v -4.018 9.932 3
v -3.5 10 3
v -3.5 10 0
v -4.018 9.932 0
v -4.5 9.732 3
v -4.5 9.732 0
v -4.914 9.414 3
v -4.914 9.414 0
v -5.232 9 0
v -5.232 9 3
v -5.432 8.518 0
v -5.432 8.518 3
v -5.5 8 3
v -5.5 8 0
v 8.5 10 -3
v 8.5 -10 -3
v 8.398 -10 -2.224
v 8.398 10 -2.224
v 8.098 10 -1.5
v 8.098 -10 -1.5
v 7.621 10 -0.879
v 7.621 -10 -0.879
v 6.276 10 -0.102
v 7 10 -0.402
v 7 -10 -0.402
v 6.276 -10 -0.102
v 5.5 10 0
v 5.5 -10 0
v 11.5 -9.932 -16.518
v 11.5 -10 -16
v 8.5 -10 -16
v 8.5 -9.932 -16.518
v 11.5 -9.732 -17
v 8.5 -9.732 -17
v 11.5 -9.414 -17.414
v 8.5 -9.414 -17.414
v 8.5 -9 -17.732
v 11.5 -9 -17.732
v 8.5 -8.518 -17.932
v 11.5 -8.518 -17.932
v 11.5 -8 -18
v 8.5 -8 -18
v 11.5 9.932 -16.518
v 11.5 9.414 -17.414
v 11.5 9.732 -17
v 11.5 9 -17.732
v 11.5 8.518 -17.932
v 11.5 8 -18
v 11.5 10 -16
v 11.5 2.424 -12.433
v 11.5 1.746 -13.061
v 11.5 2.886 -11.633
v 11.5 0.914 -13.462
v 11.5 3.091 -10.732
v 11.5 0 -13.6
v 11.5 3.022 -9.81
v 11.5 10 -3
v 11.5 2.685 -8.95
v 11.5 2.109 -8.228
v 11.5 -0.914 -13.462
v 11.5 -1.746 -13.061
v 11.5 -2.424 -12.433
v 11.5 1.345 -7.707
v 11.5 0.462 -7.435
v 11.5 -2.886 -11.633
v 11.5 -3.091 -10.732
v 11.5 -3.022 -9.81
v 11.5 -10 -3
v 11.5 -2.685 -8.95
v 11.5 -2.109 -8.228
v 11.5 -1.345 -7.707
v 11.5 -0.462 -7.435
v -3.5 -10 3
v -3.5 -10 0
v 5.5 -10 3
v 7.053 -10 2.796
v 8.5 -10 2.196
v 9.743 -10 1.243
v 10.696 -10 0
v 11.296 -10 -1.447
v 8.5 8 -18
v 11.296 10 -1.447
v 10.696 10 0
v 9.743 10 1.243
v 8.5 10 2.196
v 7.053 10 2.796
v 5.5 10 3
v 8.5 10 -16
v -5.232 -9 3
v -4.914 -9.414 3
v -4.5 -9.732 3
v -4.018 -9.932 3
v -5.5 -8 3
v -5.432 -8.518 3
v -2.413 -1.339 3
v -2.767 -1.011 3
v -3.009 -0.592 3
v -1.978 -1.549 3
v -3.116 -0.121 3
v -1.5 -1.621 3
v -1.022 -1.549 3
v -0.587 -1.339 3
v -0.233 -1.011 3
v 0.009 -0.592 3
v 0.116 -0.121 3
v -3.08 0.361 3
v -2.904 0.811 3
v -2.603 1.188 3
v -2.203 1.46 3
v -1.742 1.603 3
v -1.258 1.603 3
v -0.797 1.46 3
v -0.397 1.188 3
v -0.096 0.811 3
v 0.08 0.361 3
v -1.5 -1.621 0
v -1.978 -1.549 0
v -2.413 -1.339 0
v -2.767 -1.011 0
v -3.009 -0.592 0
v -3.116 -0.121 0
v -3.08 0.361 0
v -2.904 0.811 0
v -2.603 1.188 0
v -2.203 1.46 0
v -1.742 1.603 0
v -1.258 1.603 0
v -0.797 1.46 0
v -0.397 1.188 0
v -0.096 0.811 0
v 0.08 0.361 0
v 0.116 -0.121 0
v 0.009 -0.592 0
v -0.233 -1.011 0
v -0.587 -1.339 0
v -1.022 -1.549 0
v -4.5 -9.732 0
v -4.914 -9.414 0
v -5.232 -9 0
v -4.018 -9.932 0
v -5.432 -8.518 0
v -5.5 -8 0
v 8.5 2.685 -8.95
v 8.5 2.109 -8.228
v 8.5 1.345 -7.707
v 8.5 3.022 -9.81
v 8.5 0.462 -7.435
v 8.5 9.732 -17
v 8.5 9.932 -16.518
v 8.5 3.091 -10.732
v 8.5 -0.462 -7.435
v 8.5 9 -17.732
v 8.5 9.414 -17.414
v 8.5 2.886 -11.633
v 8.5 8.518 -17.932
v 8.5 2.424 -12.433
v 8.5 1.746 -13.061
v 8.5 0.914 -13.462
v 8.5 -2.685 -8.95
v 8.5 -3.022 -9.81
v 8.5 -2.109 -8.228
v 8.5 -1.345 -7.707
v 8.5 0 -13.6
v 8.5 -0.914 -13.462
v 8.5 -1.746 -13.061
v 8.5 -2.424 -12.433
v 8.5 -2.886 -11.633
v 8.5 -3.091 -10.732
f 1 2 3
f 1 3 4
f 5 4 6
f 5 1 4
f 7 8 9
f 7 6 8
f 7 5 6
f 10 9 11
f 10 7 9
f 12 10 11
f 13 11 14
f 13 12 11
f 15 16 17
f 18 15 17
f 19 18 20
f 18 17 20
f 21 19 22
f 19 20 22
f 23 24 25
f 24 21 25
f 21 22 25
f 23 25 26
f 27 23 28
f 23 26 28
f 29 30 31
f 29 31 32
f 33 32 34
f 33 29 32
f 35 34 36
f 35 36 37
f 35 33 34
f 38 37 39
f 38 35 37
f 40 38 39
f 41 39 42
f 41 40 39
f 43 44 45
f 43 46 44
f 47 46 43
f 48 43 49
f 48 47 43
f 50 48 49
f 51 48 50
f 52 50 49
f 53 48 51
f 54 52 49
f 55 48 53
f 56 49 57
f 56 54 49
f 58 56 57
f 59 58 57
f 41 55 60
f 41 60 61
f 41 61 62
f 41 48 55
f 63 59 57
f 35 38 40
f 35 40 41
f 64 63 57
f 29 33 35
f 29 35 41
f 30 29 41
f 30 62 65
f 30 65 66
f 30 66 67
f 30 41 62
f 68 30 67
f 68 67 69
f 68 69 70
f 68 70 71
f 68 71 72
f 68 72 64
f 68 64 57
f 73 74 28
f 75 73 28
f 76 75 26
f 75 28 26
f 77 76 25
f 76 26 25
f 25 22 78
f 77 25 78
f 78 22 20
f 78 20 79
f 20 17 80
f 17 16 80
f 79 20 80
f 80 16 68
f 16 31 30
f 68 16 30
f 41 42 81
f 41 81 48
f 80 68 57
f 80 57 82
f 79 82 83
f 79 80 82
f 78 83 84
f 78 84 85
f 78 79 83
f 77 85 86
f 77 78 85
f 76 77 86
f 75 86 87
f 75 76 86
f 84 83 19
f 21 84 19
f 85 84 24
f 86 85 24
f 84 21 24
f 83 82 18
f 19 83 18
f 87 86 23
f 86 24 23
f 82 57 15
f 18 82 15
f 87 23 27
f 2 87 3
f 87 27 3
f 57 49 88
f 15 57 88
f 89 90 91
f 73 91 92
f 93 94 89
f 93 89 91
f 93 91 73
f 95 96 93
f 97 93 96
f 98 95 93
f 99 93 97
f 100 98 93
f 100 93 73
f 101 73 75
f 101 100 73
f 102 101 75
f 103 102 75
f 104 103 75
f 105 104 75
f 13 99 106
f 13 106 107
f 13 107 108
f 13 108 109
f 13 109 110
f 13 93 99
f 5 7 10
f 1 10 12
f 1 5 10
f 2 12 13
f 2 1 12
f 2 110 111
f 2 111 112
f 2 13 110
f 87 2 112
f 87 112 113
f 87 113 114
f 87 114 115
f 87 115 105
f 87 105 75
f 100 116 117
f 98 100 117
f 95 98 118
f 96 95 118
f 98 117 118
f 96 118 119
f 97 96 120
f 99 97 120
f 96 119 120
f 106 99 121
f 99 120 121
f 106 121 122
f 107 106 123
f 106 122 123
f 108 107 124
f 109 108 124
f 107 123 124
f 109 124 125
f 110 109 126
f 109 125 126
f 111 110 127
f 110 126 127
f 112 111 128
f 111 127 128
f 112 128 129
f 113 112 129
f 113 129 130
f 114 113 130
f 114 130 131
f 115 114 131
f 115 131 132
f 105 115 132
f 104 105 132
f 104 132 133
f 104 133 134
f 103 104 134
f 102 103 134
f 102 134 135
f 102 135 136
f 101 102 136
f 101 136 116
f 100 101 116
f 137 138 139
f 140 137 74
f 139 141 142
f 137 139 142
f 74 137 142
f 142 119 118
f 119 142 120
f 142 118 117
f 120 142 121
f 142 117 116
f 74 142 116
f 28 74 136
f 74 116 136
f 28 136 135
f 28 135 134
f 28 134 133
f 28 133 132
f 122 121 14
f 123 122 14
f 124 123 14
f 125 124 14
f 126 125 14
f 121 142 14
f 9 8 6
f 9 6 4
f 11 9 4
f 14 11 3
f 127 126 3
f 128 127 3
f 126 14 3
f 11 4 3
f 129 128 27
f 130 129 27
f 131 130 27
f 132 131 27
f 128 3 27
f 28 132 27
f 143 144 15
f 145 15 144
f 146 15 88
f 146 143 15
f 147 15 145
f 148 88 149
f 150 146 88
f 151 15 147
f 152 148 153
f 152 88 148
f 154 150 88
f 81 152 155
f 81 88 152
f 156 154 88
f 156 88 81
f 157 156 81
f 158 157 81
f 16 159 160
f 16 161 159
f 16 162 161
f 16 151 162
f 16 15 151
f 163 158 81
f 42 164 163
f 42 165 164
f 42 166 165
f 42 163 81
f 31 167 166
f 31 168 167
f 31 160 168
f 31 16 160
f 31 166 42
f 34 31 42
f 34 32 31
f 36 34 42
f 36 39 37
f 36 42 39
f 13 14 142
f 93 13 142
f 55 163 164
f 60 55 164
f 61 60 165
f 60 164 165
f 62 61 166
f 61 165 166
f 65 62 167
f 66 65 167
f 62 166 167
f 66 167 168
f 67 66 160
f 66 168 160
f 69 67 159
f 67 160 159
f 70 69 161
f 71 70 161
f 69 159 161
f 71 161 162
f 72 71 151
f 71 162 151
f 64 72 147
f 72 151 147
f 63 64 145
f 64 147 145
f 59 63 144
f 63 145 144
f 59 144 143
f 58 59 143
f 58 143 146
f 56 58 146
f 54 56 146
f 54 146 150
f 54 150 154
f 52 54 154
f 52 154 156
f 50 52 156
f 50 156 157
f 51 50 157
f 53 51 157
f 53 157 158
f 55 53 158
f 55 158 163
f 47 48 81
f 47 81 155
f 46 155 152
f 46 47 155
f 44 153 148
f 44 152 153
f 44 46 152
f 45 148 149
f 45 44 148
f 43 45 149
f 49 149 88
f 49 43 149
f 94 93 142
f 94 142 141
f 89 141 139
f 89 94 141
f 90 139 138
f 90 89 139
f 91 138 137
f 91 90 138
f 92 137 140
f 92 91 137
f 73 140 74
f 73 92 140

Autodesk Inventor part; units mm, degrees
ref_plane "YZ Plane" through (0, 0, 0) normal (1, 0, 0) x (0, 1, 0)
ref_plane "XZ Plane" through (0, 0, 0) normal (0, 1, 0) x (-1, 0, 0)
ref_plane "XY Plane" through (0, 0, 0) normal (0, 0, 1) x (1, 0, 0)
sketch "スケッチ1" plane through (0, 0, 0) normal (0, 0, 1) x (1, 0, 0)
  line L0 (-5.5, -10) -> (5.5, -10)
  line L1 (5.5, -10) -> (5.5, 10)
  line L2 (5.5, 10) -> (-5.5, 10)
  line L3 (-5.5, 10) -> (-5.5, -10)
  line L4 (-5.5, -10) -> (5.5, 10) construction
  line L5 (5.5, -10) -> (-5.5, 10) construction
  point P0 (0, 0)
  dimension "d0" = 11
  dimension "d1" = 20
extrude "プレート1" add sketch "スケッチ1" along normal blind 3
sketch "スケッチ2" plane through (8.5, -10, -3) normal (1, 0, 0) x (0, 1, 0)
  line L0 (20, 0) -> (0, 0)
  line L1 (0, 0) -> (0, -15)
  line L2 (0, -15) -> (20, -15)
  line L3 (20, -15) -> (20, 0)
edge flange "フランジ1" height 21 angle 90 thickness 3 bend radius 3 thickness toward (1, 0, 0) relief tear relief width 3 relief depth 1.5 edges at (5.5, 0, 0) wall of the first edge with corners at (8.5, 10, -3) (8.5, -10, -3) (8.5, -10, -18) (8.5, 10, -18)
bend "曲げ1"
corner "コーナー1"
sketch "スケッチ3" plane through (0, 0, 3) normal (0, 0, 1) x (1, 0, 0)
  line L0 (-5.5, -10) -> (-5.5, 10) projected
  line L1 (5.5, -10) -> (-5.5, -10) projected
  line L2 (5.5, 10) -> (5.5, -10) projected
  line L3 (-5.5, 10) -> (5.5, 10) projected
  point P0 (-1.5, 0)
  dimension "d29" = 4
hole "穴1" at (-1.5, 0, 3) direction (0, 0, -1) diameter 3.242 end through all thread size "M4x0.7" class "6H" standard "ISO Metric profile"
sketch "スケッチ4" plane through (11.5, -10, -18) normal (1, 0, 0) x (0, 0, -1)
  line L0 (-15, 20) -> (-15, 0) projected
  line L1 (0, 0) -> (-15, 0) projected
  line L2 (0, 20) -> (0, 0) projected
  line L3 (-15, 20) -> (0, 20) projected
  point P0 (-18, 10)
  point P1 (-7.5, 10)
  dimension "d20" = 7.5
hole "穴2" at (11.5, 0, -10.5) direction (-1, 0, 0) diameter 6.2 end through all
fillet "フィレット1" radius 2 4 edges at (-5.5, 10, 1.5) (-5.5, -10, 1.5) (10, -10, -18) (10, 10, -18)
equation "\"d2\" = Thickness"
equation "\"d3\" = BendReliefWidth"
equation "\"d4\" = BendReliefDepth"
equation "\"d5\" = MinimumRemnant"
equation "\"d6\" = TransitionRadius"
equation "\"d9\" = BendRadius"
equation "\"d10\" = CornerReliefSize"
equation "\"d11\" = GapSize"
equation "\"d12\" = JacobiRadiusSize"
equation "\"BendRadius\" = Thickness"
equation "\"BendReliefWidth\" = Thickness"
equation "\"BendReliefDepth\" = 0.5 * Thickness"
equation "\"CornerReliefSize\" = 4 * Thickness"
equation "\"MinimumRemnant\" = 2 * Thickness"
equation "\"TransitionRadius\" = BendRadius"
equation "\"JacobiRadiusSize\" = BendRadius"
equation "\"GapSize\" = Thickness"
equation "\"Thickness\" = 3"
properties part number "Belt_Tenshon_Meviy"
